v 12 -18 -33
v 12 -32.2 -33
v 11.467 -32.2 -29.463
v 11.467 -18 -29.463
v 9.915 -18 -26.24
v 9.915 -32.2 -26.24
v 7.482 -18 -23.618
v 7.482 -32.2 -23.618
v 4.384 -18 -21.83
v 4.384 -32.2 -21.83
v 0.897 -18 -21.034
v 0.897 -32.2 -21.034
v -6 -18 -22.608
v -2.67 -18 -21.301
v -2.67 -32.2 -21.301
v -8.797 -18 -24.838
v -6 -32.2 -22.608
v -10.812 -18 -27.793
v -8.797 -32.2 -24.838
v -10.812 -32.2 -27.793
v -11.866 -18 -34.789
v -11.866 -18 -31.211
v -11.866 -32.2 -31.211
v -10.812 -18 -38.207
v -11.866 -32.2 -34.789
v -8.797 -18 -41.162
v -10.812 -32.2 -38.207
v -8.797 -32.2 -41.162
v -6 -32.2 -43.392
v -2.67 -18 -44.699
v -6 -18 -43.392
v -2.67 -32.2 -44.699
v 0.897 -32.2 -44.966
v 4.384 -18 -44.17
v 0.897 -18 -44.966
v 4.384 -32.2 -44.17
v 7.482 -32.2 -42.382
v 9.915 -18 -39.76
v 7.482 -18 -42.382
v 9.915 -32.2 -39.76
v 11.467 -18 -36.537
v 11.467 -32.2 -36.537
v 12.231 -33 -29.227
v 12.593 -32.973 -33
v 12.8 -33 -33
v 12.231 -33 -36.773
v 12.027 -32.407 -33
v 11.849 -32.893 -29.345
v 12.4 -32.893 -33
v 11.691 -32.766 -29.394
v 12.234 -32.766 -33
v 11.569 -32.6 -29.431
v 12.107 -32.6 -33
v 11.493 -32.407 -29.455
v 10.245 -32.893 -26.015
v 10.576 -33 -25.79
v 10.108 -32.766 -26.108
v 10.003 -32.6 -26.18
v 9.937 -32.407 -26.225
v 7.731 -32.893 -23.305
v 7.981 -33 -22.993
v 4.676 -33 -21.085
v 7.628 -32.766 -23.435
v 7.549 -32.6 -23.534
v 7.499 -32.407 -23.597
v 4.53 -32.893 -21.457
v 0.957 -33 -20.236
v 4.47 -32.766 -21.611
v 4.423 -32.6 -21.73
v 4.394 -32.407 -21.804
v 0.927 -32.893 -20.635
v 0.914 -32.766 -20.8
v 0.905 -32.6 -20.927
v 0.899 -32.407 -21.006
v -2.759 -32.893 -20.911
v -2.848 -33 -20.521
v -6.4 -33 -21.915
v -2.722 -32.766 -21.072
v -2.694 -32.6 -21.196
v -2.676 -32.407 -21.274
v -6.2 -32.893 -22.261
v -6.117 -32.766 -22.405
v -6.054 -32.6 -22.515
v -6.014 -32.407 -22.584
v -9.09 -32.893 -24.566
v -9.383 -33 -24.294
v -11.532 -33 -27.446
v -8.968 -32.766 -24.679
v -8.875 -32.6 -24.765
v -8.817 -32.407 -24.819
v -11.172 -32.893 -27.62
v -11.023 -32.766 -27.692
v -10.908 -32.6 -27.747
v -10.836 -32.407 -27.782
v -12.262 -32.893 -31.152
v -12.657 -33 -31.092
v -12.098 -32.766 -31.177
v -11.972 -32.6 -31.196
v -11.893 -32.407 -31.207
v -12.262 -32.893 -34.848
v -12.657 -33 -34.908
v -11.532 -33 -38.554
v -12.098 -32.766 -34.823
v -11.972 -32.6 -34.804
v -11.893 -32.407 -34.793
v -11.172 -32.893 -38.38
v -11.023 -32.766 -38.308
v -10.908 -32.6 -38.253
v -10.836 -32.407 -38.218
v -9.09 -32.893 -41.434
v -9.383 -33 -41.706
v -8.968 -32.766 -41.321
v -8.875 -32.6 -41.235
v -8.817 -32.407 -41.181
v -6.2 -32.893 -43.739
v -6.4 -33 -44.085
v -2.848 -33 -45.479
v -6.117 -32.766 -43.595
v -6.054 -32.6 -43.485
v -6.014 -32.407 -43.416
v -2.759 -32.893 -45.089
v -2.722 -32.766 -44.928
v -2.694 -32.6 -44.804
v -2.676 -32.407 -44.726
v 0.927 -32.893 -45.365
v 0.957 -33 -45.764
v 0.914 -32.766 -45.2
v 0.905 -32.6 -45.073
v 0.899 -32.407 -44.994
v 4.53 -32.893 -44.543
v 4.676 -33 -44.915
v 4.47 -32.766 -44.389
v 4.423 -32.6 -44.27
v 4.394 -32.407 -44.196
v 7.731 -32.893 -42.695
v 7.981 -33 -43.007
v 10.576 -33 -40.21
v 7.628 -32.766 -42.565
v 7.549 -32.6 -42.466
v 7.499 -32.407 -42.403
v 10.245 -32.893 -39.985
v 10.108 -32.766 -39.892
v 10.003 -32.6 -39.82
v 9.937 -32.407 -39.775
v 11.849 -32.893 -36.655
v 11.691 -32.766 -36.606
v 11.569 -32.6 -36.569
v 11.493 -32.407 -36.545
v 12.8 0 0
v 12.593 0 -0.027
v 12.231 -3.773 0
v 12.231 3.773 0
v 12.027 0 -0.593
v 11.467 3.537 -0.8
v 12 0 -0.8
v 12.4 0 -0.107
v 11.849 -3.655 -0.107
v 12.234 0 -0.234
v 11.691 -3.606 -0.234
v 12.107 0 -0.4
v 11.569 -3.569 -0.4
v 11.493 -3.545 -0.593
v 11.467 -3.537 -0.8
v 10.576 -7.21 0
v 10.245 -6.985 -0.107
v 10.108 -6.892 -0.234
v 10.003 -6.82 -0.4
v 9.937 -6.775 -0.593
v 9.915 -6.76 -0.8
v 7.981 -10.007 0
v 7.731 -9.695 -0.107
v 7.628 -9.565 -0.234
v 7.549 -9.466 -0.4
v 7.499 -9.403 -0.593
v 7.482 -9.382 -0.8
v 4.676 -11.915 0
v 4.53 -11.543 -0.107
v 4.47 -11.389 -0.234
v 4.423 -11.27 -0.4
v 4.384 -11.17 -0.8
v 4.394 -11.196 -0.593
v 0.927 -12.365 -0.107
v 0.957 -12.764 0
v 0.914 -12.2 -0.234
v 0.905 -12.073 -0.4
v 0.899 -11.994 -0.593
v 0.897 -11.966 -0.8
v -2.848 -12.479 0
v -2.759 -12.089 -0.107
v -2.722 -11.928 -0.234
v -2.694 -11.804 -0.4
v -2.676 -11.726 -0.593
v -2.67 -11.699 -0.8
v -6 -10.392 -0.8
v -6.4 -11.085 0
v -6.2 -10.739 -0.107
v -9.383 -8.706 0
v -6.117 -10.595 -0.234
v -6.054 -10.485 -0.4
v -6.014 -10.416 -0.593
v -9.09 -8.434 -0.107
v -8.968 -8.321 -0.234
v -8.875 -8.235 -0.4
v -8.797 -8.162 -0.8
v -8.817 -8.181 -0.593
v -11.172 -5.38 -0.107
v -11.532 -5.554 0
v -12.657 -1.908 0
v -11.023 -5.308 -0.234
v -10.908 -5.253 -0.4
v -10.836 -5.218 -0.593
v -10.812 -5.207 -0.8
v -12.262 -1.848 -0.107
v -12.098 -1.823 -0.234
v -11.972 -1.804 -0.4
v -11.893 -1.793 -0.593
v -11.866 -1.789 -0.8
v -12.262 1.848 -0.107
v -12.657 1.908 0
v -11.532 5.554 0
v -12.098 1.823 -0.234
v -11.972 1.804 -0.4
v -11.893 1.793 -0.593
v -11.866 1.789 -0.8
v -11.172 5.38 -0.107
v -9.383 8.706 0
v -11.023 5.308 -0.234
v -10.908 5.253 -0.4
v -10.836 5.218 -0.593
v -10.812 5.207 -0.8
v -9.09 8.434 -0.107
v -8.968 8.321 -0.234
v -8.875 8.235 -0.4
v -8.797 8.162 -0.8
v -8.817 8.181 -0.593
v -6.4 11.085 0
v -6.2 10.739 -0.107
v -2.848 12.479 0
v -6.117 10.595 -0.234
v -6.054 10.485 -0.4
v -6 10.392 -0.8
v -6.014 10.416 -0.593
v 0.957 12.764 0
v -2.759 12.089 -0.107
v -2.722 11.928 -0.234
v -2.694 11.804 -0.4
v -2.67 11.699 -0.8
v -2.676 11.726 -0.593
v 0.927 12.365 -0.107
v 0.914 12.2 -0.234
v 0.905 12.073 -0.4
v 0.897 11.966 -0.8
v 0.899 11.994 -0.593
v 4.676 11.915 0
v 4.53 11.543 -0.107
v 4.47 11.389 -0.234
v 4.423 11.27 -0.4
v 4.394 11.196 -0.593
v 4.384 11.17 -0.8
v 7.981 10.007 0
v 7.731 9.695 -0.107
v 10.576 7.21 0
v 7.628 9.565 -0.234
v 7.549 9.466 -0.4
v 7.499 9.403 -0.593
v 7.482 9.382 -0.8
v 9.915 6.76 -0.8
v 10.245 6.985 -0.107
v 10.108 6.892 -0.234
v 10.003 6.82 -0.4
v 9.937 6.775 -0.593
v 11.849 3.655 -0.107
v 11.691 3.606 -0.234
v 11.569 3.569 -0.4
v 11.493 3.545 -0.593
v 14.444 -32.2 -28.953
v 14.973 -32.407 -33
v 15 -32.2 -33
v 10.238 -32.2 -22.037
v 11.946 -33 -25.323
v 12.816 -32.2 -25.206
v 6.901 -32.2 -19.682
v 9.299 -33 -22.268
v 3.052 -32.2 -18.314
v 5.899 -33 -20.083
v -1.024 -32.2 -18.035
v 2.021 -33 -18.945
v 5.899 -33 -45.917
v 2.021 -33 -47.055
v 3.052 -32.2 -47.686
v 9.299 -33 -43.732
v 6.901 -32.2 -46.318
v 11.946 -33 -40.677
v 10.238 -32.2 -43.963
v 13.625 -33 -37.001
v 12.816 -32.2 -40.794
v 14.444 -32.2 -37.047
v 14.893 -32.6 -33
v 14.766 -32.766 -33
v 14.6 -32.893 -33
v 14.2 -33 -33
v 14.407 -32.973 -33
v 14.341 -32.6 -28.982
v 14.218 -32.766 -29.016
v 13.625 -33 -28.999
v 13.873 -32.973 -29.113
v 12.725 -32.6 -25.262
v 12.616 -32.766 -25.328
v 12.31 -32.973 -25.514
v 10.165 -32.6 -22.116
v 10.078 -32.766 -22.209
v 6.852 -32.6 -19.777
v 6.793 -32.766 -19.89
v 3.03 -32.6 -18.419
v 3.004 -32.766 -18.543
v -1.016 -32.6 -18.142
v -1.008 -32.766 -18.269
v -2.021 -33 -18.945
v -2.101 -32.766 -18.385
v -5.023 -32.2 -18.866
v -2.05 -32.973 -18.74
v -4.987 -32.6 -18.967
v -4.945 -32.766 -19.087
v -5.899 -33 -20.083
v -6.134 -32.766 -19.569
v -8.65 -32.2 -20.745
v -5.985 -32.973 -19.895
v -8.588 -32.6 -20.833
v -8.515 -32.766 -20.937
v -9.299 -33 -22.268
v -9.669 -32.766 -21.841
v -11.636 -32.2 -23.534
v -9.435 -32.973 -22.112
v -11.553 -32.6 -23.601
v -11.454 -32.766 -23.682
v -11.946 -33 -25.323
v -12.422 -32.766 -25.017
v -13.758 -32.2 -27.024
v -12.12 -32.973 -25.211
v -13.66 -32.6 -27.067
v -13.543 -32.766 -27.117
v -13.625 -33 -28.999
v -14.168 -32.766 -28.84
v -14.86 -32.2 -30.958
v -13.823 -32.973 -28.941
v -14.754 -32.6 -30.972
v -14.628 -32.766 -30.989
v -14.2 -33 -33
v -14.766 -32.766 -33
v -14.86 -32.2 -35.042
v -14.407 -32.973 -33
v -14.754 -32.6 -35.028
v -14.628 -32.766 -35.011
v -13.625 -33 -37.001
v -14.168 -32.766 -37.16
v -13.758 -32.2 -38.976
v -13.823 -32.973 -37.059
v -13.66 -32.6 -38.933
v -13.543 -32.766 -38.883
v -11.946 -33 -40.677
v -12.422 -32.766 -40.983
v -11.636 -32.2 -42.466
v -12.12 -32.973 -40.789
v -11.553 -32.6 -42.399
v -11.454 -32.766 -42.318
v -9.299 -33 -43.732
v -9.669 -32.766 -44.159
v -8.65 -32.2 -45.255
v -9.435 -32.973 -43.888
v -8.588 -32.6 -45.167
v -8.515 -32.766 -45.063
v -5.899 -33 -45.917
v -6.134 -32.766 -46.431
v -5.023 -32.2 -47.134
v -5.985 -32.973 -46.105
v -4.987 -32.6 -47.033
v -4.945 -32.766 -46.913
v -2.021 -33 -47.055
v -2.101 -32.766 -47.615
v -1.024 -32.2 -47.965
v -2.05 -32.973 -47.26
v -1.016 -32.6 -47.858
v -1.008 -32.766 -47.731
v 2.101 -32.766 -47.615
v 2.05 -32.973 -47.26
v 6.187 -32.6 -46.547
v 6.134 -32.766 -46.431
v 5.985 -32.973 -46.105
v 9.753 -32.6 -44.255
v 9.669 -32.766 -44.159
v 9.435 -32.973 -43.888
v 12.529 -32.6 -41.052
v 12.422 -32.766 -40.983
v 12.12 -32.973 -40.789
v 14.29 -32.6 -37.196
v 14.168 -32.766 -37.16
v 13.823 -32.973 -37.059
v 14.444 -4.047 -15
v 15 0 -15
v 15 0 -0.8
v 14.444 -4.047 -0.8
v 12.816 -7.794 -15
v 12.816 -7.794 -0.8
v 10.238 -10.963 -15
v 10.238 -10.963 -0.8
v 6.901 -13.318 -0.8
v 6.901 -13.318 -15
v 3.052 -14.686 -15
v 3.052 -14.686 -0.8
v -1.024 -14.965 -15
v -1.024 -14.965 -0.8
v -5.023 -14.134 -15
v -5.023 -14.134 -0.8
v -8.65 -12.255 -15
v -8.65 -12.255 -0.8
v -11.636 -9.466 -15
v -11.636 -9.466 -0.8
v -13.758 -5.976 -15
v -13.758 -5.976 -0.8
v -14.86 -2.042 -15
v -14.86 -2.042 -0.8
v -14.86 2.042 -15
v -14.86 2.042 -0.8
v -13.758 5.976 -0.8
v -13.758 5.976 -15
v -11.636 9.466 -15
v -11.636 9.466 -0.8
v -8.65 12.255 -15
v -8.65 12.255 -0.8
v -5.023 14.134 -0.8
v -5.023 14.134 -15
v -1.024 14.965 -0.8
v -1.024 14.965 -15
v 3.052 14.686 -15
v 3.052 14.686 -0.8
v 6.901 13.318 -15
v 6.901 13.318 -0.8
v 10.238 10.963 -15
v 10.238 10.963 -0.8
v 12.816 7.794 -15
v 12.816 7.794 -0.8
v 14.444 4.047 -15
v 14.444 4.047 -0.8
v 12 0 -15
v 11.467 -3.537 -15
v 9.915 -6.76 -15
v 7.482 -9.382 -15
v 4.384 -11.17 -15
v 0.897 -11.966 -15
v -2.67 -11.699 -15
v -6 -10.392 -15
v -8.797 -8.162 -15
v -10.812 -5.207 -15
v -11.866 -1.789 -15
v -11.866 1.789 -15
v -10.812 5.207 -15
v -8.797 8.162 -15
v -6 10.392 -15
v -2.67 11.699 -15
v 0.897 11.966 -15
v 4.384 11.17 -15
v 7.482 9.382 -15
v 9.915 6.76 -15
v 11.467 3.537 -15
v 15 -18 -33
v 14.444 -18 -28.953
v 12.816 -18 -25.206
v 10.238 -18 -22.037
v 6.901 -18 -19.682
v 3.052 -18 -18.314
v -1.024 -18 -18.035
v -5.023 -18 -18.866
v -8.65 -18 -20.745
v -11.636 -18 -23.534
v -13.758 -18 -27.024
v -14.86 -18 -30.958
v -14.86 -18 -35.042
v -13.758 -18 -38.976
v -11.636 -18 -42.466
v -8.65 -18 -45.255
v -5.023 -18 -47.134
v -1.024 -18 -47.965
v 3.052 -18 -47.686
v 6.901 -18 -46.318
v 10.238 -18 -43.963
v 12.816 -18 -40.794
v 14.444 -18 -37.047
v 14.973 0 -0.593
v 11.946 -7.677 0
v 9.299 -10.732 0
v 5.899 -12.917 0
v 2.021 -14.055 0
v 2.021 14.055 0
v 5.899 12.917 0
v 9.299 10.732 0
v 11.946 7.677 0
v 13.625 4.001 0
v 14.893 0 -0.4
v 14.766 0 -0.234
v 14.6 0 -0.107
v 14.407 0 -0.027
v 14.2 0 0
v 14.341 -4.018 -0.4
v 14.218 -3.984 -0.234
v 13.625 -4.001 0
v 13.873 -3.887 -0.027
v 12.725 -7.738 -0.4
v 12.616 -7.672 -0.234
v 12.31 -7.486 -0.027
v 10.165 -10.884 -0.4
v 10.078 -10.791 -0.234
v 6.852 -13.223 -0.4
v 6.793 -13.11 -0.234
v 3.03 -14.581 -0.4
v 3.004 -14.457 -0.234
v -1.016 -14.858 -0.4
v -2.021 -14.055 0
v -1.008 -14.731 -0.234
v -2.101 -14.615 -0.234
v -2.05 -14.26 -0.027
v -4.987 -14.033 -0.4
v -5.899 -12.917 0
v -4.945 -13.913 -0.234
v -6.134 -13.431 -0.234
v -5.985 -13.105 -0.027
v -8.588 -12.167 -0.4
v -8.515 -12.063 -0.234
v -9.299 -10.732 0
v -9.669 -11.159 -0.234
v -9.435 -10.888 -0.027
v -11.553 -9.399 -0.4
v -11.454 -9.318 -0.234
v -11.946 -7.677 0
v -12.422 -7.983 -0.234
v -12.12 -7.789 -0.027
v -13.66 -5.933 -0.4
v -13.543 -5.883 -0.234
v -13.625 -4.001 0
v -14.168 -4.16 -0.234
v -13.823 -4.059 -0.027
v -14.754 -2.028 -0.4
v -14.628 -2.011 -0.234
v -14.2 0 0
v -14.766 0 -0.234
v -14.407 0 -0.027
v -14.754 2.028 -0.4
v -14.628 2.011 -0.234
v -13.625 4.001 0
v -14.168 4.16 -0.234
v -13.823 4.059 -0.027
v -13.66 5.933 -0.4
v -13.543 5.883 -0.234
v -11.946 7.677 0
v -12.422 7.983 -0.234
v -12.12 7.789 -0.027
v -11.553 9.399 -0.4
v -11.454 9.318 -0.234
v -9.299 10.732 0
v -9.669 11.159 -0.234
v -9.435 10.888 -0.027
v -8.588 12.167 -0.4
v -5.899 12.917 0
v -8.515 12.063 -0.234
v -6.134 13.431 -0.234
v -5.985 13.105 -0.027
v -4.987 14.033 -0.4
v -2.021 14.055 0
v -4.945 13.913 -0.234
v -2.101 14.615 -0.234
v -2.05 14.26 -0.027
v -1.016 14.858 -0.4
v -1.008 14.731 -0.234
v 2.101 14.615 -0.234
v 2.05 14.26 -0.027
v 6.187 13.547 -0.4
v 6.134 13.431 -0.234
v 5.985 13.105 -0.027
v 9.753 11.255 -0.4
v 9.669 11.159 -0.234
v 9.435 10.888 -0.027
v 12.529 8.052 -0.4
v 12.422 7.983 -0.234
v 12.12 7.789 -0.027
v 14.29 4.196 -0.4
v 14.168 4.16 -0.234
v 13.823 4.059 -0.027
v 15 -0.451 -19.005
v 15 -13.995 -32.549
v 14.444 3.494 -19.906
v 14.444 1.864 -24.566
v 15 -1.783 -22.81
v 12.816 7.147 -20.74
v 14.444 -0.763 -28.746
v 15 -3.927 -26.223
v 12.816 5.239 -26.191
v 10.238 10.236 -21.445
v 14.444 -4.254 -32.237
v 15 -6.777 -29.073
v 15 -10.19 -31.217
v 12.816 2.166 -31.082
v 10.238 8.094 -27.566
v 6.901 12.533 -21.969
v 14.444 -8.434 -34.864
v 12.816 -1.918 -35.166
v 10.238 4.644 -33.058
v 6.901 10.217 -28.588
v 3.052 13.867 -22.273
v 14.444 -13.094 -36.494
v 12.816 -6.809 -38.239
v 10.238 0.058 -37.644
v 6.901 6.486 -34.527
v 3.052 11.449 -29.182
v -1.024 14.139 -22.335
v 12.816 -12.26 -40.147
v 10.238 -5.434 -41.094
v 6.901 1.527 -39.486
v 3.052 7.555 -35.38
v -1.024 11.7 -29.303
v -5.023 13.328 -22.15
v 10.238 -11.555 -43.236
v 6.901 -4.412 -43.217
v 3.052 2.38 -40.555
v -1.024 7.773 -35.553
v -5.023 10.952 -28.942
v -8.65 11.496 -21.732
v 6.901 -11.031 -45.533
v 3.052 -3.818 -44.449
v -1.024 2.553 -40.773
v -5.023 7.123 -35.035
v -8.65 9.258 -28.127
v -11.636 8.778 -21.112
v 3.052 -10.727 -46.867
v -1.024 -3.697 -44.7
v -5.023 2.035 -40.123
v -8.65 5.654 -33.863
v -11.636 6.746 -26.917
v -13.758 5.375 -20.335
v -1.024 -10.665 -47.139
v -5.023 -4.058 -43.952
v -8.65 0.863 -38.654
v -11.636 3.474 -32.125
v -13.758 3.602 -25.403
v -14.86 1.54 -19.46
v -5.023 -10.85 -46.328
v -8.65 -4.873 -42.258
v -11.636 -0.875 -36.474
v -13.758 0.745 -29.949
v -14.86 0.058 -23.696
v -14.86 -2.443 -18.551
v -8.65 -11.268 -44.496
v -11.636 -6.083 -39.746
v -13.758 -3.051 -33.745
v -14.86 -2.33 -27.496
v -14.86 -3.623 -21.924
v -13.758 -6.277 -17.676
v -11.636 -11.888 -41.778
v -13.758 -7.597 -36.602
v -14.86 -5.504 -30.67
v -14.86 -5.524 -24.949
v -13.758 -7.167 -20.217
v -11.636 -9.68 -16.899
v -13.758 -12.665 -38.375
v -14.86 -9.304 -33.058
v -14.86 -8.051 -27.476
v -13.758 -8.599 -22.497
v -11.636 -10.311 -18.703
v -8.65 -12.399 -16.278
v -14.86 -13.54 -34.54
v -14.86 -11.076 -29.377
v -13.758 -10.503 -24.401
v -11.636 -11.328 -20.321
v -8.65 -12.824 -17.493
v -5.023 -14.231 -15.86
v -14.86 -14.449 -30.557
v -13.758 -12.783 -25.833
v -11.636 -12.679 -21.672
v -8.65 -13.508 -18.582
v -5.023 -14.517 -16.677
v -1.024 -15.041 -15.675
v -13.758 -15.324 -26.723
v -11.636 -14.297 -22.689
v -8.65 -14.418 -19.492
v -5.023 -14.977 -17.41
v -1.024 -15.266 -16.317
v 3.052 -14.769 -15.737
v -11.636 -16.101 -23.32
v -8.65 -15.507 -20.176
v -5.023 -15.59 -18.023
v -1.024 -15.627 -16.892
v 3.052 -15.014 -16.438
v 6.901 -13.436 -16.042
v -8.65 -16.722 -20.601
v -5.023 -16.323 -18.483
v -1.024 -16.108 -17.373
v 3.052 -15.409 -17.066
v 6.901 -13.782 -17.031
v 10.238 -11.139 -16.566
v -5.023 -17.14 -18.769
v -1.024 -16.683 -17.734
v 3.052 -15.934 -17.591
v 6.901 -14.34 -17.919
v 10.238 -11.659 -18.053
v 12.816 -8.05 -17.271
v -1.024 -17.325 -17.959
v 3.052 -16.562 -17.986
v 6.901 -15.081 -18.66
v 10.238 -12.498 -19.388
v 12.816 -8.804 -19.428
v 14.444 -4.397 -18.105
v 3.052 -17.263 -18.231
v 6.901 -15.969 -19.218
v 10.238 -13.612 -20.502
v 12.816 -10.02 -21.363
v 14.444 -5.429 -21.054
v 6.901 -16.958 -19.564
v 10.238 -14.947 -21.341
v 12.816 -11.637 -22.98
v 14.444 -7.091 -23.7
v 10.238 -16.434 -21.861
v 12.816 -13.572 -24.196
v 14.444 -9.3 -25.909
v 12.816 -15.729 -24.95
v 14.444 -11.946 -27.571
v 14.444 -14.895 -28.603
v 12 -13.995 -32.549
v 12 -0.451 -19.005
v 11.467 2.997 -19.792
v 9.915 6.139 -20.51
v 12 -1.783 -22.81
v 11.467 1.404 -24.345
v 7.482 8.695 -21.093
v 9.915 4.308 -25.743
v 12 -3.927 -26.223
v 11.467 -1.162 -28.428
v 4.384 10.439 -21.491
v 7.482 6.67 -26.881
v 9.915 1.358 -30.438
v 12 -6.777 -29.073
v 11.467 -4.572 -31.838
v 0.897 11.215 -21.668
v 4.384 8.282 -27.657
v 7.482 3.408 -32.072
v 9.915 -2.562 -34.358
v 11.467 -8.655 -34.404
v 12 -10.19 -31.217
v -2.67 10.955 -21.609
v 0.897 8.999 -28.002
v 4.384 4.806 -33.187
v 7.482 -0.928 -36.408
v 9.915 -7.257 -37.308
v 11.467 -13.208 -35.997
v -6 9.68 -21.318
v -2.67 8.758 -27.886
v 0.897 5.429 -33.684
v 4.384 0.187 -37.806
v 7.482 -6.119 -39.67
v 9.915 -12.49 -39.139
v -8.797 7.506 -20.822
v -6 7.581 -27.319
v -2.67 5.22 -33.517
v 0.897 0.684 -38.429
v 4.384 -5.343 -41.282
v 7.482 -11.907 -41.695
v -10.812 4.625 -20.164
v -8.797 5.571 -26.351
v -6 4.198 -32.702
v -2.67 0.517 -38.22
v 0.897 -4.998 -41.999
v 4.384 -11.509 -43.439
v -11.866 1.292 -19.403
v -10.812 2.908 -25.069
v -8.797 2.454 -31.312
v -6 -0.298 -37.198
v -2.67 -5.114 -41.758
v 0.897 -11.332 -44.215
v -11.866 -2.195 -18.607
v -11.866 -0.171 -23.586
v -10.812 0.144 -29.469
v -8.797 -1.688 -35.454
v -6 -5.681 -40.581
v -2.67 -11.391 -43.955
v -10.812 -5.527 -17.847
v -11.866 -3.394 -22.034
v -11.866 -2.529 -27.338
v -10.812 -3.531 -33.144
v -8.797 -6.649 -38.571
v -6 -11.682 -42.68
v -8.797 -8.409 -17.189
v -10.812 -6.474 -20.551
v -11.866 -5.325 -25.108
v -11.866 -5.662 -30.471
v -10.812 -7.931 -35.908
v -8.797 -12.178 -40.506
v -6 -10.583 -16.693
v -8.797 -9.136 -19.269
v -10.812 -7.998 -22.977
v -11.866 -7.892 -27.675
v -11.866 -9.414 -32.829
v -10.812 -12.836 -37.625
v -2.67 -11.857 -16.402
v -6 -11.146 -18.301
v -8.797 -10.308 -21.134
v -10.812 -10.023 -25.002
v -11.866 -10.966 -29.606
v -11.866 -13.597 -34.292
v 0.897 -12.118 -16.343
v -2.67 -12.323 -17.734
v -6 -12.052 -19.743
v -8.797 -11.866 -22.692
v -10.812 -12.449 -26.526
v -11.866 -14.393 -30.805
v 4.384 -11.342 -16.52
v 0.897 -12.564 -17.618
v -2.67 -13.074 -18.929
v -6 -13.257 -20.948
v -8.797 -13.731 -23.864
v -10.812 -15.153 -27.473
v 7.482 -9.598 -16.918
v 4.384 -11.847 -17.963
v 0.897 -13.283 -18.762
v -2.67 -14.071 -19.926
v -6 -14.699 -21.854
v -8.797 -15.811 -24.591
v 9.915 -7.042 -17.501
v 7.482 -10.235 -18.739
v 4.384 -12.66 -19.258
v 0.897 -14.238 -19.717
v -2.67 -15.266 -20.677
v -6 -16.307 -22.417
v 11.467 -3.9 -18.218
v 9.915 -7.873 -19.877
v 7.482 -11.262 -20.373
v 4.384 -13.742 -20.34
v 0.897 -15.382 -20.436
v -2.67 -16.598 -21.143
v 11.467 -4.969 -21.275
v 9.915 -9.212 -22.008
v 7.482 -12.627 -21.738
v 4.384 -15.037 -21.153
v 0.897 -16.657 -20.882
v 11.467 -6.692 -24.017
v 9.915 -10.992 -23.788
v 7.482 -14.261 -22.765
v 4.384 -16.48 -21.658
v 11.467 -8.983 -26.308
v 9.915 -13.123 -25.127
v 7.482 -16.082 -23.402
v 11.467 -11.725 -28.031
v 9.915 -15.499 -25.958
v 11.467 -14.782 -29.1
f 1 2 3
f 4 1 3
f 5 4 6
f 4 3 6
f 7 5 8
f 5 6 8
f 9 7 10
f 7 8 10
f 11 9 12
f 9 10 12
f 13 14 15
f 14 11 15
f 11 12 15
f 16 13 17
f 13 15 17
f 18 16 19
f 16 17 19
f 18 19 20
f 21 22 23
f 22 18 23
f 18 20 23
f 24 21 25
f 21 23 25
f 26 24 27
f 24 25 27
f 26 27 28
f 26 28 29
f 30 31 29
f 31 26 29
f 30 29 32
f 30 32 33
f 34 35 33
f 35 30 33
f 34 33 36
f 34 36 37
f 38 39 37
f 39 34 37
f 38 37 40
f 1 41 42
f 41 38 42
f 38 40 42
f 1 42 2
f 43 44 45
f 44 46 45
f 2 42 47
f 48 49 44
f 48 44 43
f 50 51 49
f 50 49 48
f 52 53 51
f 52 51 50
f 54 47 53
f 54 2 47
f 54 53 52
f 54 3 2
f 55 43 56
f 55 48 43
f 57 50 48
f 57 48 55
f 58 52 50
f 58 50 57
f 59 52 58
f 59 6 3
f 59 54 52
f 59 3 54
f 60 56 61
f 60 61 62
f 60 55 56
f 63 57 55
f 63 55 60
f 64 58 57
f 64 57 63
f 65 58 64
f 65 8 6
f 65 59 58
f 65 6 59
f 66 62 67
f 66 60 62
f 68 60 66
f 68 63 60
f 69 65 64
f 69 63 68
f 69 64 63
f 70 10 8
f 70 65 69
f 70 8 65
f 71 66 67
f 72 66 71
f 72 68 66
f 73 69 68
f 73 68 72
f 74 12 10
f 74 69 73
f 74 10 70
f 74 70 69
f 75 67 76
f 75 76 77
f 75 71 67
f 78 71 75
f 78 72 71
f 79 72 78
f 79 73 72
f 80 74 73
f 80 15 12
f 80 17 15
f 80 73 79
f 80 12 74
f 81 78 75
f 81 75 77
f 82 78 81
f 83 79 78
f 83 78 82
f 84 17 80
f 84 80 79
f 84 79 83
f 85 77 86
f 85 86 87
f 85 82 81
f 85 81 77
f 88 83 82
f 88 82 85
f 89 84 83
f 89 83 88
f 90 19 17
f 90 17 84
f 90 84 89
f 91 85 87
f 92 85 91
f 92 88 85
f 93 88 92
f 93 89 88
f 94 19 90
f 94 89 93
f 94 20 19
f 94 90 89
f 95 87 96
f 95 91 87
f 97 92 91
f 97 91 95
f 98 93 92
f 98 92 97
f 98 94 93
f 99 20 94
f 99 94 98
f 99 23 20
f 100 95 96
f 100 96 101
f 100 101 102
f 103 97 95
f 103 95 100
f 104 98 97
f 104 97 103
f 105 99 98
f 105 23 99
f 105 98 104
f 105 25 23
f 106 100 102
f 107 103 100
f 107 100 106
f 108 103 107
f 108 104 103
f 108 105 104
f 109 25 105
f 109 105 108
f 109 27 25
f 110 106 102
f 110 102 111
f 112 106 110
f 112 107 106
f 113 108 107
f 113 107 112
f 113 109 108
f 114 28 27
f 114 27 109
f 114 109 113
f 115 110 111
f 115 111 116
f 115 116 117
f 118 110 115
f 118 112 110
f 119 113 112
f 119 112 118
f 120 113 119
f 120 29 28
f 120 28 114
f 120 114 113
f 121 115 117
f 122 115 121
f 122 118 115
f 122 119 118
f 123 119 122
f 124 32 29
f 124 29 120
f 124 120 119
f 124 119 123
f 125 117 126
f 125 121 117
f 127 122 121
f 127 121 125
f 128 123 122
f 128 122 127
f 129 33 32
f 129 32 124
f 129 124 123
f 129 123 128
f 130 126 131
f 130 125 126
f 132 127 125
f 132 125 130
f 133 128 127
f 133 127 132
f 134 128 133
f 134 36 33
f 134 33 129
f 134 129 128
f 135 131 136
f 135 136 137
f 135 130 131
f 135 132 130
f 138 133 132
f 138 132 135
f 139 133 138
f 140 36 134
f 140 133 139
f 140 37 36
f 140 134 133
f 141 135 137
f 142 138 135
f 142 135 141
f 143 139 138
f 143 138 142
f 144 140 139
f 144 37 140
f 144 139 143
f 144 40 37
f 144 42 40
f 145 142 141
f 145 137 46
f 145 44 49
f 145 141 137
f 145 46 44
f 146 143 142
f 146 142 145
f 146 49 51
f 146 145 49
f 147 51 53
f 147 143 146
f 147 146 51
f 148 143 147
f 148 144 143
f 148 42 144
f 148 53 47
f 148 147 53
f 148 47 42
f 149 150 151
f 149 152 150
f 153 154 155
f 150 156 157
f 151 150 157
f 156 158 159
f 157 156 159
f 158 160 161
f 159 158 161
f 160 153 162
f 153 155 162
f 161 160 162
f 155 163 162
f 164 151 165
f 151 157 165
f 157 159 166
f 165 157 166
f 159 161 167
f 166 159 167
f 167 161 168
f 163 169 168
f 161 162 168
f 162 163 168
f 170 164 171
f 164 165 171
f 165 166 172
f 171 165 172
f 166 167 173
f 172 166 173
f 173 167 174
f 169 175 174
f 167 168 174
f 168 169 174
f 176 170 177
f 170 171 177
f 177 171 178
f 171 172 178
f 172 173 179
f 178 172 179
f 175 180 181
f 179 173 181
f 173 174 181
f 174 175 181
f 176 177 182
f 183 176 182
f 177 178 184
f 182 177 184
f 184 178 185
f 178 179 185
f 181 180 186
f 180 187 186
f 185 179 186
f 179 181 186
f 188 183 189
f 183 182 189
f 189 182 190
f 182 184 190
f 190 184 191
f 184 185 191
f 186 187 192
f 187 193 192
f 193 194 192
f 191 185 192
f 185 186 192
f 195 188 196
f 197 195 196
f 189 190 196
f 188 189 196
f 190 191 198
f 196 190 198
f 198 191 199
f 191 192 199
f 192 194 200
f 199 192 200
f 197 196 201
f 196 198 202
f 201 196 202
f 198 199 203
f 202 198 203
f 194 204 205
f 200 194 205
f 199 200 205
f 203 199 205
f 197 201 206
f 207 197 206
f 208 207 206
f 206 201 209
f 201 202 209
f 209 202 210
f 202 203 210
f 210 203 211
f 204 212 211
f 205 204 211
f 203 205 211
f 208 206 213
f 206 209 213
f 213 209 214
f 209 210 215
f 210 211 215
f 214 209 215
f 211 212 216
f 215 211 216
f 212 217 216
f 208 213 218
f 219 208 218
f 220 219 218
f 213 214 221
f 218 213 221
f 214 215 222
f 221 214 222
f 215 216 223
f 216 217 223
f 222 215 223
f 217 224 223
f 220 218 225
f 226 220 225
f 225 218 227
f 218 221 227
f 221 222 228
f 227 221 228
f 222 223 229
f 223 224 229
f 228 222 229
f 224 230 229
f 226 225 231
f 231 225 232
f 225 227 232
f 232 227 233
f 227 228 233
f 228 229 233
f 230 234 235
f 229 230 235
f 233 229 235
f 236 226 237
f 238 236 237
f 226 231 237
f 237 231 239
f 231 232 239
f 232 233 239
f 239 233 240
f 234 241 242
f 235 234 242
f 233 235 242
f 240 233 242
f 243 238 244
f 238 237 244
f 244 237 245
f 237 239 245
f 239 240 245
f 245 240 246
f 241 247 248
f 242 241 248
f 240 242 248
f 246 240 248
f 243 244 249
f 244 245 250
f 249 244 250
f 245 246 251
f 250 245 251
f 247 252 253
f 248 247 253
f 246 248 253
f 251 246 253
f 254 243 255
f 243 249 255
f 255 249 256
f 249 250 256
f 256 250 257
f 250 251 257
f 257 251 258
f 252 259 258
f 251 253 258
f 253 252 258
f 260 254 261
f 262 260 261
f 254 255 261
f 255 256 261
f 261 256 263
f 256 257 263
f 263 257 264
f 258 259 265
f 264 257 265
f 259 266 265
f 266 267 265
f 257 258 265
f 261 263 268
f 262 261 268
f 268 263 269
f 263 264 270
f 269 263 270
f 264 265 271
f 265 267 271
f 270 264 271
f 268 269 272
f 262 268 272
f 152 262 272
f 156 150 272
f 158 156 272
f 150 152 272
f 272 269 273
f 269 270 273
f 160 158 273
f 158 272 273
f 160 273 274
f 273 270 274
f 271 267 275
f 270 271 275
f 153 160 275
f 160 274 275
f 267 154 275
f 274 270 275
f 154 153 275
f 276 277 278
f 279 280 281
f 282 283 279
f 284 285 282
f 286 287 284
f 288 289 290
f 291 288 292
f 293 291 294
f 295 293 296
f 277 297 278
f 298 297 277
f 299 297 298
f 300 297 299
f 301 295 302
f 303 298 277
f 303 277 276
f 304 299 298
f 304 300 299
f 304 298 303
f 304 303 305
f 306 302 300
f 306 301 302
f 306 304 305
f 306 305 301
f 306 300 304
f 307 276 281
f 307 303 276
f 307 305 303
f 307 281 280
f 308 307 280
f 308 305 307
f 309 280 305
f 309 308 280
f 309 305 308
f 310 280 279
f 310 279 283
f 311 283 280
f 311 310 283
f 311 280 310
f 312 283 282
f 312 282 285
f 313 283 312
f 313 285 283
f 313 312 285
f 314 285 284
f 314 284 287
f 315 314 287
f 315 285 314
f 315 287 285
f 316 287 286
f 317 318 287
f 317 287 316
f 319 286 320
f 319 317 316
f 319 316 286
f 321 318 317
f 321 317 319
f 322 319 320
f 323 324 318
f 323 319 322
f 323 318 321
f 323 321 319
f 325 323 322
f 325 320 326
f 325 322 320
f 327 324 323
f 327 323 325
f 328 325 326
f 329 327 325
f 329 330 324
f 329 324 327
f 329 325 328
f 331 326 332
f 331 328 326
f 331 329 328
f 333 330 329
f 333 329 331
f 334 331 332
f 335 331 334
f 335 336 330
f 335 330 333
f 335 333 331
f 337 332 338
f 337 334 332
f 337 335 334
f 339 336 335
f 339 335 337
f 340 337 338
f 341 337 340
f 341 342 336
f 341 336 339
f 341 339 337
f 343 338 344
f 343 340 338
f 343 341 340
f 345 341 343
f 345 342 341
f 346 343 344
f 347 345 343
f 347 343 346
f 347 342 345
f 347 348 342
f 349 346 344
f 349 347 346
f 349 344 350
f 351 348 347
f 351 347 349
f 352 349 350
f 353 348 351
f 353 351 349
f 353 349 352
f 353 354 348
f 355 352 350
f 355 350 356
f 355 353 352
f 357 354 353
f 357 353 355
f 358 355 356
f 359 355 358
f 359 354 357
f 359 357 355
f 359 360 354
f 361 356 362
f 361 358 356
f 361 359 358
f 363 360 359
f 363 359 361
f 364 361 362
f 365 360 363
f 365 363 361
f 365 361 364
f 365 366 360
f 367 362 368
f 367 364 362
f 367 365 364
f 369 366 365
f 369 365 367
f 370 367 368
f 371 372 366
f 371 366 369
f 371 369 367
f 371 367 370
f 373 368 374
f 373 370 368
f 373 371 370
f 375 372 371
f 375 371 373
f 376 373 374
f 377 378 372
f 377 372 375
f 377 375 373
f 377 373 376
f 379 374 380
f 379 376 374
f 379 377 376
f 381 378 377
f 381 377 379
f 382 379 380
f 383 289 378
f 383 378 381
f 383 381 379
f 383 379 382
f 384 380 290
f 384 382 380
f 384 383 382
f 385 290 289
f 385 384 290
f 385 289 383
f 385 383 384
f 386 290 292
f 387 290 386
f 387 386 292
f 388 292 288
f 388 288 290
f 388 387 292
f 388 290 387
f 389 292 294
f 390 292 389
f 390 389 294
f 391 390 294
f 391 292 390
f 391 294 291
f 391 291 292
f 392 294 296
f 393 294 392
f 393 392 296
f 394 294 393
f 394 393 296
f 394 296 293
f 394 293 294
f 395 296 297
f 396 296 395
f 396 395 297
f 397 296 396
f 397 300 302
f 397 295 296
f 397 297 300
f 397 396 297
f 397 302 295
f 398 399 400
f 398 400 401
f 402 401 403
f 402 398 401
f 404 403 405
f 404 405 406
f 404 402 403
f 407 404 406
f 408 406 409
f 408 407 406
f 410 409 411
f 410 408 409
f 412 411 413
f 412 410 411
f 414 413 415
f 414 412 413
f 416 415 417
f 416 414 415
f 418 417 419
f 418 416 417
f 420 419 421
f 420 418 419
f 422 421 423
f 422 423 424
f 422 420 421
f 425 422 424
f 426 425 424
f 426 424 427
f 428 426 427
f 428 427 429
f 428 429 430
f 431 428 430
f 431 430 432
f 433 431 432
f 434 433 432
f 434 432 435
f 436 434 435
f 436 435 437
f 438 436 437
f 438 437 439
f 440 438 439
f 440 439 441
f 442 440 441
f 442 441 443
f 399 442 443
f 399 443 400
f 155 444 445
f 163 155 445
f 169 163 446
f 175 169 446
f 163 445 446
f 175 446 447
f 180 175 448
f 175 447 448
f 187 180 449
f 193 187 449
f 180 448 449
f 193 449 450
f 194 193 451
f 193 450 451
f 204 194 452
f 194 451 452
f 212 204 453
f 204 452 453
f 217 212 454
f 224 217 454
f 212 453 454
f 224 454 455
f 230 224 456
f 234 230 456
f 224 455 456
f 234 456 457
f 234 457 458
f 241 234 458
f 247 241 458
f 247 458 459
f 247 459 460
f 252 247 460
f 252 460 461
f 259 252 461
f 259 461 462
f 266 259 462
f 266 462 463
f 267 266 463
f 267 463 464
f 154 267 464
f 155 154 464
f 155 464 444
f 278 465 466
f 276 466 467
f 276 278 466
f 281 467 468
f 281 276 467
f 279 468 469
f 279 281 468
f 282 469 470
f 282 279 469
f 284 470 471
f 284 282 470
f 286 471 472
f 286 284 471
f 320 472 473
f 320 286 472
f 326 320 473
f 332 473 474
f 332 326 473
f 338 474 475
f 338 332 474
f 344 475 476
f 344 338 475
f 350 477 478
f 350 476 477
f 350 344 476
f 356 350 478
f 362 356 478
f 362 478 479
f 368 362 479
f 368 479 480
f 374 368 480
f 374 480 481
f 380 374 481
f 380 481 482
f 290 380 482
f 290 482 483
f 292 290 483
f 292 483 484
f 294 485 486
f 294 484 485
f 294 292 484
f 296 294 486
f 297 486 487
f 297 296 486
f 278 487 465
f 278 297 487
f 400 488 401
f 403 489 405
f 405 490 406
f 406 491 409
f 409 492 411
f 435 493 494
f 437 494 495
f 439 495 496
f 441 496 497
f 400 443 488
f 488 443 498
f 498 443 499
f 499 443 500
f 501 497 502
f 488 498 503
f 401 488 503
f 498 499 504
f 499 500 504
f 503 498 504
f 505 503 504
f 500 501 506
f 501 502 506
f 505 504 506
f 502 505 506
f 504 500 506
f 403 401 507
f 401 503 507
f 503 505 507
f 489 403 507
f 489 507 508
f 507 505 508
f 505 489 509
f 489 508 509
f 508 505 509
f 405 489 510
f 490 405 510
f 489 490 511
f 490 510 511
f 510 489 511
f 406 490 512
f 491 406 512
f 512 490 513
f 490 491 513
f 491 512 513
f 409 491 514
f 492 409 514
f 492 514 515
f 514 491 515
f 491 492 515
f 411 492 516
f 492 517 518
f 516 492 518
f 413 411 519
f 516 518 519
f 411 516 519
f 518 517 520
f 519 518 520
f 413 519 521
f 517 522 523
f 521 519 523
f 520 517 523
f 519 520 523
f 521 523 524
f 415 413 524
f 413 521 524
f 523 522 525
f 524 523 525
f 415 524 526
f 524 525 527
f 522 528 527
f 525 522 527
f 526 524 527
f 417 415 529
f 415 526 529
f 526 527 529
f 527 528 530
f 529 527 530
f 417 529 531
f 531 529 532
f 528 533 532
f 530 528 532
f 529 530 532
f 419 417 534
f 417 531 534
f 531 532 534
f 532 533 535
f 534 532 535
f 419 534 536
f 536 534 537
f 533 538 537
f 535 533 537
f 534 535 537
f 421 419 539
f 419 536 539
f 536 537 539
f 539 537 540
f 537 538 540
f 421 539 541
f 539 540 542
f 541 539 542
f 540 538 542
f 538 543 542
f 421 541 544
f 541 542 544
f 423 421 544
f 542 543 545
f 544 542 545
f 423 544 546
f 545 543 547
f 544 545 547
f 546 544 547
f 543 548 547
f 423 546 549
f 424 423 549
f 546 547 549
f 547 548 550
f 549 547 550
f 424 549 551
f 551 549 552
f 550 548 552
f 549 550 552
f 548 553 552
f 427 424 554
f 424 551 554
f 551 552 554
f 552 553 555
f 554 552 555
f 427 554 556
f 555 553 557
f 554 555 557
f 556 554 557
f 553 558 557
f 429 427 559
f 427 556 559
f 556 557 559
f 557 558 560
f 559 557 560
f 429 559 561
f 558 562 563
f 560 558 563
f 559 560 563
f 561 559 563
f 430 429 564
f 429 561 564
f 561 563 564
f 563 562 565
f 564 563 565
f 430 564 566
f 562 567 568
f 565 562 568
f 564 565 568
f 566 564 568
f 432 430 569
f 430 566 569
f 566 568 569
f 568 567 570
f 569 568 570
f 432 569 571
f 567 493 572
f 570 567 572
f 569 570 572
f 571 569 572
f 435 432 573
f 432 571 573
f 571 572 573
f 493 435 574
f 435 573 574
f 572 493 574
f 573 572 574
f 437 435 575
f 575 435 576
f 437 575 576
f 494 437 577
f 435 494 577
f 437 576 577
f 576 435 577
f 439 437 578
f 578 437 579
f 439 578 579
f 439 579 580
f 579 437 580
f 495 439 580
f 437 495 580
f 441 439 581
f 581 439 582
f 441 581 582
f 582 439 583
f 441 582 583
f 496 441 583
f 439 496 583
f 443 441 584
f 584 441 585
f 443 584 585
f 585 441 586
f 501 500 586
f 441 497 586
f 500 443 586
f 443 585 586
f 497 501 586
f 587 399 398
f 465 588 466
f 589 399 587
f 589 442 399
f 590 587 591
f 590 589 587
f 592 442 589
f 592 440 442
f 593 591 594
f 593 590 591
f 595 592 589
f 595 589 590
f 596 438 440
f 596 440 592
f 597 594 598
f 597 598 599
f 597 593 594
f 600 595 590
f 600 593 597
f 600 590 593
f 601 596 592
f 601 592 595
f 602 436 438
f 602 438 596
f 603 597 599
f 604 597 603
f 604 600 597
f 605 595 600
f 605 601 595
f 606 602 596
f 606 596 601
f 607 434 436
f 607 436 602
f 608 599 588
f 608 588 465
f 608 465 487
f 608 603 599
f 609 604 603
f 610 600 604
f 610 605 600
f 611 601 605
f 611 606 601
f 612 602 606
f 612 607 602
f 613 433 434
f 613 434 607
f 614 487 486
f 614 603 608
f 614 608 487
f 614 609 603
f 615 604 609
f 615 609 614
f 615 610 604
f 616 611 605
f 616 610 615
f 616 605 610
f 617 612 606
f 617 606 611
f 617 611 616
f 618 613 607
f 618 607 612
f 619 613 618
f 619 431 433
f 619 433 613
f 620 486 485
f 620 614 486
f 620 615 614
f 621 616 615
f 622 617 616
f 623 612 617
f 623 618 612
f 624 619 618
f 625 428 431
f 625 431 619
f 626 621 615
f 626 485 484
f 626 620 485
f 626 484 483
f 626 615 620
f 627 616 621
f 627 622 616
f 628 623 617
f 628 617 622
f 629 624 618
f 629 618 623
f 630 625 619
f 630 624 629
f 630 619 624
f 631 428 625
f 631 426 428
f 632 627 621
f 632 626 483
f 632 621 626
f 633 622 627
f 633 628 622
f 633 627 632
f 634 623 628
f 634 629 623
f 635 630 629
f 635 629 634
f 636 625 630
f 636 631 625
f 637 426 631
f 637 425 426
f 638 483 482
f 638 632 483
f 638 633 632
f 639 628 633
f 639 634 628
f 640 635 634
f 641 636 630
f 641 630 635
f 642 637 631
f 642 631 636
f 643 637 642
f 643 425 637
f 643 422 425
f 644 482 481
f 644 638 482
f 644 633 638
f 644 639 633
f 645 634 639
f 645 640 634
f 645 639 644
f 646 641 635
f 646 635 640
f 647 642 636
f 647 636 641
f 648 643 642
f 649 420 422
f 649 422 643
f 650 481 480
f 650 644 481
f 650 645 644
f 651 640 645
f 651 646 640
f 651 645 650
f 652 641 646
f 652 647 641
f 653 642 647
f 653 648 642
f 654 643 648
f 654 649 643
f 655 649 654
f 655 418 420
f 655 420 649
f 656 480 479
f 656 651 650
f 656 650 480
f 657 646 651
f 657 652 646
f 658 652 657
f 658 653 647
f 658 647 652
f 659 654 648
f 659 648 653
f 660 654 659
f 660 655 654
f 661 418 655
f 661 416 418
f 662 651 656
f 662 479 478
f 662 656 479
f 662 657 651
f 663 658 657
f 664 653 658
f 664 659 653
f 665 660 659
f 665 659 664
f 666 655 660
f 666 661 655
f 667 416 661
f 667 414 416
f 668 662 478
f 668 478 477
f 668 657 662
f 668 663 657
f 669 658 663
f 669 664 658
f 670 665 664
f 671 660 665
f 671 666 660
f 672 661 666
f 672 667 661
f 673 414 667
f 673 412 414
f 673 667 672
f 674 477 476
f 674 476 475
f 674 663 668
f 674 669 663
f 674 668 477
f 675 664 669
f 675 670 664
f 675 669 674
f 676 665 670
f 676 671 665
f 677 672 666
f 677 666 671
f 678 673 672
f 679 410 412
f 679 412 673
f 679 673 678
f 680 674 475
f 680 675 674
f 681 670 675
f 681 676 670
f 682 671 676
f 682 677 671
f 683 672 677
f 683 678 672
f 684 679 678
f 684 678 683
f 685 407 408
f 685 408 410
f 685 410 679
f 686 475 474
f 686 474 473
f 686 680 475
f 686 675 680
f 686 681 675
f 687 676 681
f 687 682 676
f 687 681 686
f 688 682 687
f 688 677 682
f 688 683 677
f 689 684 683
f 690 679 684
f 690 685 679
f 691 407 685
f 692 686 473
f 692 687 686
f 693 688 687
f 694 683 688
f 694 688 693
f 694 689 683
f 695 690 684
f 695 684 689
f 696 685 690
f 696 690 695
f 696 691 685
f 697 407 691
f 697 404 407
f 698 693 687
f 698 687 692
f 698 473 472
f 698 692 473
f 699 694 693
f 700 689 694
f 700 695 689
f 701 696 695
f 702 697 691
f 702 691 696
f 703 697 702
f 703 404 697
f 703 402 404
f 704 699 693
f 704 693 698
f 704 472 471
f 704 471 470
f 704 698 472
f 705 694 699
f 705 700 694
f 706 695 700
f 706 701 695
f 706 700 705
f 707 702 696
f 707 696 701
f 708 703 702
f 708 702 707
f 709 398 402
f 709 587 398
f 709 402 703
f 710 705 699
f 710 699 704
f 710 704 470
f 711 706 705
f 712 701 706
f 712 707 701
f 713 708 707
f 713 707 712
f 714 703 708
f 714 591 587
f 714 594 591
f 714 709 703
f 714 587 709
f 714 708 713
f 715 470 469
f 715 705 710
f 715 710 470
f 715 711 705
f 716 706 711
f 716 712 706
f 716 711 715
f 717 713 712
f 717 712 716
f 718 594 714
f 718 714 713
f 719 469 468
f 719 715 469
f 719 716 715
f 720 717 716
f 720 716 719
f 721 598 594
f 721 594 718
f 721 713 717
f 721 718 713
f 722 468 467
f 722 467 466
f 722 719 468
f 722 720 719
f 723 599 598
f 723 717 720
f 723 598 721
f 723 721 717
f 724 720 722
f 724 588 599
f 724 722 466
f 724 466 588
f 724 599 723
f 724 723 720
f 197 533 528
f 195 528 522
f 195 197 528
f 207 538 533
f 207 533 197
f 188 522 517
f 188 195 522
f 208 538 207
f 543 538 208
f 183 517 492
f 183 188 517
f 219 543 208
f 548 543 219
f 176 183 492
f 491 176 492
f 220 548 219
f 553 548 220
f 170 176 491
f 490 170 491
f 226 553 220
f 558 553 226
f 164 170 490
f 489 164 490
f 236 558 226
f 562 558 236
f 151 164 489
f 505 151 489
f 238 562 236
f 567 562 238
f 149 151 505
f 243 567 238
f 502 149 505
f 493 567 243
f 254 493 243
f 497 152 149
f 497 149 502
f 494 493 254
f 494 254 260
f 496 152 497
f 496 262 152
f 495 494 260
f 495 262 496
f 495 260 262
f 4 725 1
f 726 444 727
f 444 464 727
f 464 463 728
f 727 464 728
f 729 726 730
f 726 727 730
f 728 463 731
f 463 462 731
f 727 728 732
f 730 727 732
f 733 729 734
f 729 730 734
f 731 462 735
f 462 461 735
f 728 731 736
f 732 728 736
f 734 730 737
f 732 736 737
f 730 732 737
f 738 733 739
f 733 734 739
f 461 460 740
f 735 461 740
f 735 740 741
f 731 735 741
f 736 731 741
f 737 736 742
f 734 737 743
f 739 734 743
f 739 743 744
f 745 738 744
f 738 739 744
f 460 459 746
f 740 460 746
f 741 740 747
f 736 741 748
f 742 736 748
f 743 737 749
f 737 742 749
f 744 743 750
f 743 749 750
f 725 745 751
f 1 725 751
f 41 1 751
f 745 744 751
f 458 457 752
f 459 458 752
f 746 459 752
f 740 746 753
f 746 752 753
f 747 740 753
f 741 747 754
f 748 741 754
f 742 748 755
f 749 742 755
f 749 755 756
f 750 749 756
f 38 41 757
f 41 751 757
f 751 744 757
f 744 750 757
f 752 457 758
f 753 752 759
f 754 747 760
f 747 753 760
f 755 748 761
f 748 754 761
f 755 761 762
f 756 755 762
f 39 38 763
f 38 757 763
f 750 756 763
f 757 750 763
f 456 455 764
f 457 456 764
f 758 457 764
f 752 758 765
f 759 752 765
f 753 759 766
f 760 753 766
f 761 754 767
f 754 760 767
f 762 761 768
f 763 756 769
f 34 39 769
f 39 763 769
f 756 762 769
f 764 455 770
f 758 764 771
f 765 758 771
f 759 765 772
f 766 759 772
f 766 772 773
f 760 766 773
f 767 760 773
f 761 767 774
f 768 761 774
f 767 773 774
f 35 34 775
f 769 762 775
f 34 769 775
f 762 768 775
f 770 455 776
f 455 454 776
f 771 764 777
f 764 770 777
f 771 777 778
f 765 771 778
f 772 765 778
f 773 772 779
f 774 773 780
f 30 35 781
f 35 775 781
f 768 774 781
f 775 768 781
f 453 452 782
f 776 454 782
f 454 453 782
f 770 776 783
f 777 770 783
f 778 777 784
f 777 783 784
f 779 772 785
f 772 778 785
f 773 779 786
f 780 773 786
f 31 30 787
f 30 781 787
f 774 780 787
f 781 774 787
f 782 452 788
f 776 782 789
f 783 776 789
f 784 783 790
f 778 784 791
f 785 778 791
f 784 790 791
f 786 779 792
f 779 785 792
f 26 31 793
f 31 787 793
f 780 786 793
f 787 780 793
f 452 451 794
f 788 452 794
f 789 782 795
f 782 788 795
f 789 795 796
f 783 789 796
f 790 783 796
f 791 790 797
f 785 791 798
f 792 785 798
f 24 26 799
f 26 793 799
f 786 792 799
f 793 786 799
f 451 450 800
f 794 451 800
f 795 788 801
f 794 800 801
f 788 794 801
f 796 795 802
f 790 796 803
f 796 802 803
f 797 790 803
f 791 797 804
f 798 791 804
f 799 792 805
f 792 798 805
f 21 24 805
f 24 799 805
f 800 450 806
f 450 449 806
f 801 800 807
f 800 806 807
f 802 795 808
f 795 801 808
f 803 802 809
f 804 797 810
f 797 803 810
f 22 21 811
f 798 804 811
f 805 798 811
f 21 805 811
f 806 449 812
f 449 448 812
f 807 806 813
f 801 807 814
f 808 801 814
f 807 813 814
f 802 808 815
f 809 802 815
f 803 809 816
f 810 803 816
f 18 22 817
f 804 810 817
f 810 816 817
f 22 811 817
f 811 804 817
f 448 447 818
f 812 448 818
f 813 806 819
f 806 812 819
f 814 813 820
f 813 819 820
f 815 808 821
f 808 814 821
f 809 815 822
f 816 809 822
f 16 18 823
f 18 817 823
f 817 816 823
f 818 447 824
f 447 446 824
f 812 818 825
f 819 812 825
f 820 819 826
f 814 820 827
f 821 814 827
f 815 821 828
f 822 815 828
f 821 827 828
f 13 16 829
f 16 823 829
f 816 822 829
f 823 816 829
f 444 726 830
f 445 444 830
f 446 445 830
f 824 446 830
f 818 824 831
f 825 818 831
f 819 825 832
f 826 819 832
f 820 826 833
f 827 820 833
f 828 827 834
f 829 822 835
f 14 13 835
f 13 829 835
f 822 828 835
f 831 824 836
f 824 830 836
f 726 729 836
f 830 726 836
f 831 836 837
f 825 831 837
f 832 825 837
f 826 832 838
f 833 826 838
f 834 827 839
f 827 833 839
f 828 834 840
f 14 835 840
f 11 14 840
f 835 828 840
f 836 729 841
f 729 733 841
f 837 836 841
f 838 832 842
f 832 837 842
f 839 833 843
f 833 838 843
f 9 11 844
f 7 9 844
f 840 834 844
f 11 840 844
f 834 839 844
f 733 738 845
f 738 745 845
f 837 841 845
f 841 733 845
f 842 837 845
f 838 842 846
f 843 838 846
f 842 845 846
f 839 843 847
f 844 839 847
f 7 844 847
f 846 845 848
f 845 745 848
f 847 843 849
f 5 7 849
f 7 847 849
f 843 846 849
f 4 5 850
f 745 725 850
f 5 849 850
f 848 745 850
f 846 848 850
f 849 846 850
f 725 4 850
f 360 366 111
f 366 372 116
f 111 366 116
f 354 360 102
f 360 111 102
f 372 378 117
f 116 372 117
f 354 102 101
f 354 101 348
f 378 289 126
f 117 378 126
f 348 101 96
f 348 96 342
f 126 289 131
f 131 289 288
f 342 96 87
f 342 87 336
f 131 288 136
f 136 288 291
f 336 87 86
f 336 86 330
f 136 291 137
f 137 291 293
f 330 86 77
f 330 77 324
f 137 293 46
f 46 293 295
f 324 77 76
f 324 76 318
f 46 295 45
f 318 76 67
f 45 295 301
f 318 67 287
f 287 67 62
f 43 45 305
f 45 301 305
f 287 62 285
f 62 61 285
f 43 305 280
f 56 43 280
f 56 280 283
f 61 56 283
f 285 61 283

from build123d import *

# Parameters (mm, degrees)
SKETCH1_R   = 15
SKETCH1_R_2 = 12
FILLET4_R   = 0.8
FILLET5_R   = 0.8


with BuildPart() as part:
    # Sweep3: sweep along a path in Sketch2
    with BuildLine(Plane(origin=(0, 0, 0), x_dir=(0, 0, -1), z_dir=(1, 0, 0))) as sweep3_path:
        Line((0, 0), (15, 0))
        ThreePointArc((15, 0), (27.727922061, -5.272077939), (33, -18))
        Line((33, -18), (33, -33))
    # Sketch1 → Sweep3 (sweep)
    with BuildSketch(Plane.XY):
        Circle(SKETCH1_R)
        Circle(SKETCH1_R_2, mode=Mode.SUBTRACT)
    sweep(path=sweep3_path.line)

    # Fillet4
    fillet4_edges = [part.edges().sort_by_distance(p)[0] for p in [
        (-15, 0, 0),
        (-12, 0, 0),
    ]]
    fillet(fillet4_edges, radius=FILLET4_R)

    # Fillet5
    fillet5_edges = [part.edges().sort_by_distance(p)[0] for p in [
        (-12, -33, -33),
        (-15, -33, -33),
    ]]
    fillet(fillet5_edges, radius=FILLET5_R)


solid = part.part
